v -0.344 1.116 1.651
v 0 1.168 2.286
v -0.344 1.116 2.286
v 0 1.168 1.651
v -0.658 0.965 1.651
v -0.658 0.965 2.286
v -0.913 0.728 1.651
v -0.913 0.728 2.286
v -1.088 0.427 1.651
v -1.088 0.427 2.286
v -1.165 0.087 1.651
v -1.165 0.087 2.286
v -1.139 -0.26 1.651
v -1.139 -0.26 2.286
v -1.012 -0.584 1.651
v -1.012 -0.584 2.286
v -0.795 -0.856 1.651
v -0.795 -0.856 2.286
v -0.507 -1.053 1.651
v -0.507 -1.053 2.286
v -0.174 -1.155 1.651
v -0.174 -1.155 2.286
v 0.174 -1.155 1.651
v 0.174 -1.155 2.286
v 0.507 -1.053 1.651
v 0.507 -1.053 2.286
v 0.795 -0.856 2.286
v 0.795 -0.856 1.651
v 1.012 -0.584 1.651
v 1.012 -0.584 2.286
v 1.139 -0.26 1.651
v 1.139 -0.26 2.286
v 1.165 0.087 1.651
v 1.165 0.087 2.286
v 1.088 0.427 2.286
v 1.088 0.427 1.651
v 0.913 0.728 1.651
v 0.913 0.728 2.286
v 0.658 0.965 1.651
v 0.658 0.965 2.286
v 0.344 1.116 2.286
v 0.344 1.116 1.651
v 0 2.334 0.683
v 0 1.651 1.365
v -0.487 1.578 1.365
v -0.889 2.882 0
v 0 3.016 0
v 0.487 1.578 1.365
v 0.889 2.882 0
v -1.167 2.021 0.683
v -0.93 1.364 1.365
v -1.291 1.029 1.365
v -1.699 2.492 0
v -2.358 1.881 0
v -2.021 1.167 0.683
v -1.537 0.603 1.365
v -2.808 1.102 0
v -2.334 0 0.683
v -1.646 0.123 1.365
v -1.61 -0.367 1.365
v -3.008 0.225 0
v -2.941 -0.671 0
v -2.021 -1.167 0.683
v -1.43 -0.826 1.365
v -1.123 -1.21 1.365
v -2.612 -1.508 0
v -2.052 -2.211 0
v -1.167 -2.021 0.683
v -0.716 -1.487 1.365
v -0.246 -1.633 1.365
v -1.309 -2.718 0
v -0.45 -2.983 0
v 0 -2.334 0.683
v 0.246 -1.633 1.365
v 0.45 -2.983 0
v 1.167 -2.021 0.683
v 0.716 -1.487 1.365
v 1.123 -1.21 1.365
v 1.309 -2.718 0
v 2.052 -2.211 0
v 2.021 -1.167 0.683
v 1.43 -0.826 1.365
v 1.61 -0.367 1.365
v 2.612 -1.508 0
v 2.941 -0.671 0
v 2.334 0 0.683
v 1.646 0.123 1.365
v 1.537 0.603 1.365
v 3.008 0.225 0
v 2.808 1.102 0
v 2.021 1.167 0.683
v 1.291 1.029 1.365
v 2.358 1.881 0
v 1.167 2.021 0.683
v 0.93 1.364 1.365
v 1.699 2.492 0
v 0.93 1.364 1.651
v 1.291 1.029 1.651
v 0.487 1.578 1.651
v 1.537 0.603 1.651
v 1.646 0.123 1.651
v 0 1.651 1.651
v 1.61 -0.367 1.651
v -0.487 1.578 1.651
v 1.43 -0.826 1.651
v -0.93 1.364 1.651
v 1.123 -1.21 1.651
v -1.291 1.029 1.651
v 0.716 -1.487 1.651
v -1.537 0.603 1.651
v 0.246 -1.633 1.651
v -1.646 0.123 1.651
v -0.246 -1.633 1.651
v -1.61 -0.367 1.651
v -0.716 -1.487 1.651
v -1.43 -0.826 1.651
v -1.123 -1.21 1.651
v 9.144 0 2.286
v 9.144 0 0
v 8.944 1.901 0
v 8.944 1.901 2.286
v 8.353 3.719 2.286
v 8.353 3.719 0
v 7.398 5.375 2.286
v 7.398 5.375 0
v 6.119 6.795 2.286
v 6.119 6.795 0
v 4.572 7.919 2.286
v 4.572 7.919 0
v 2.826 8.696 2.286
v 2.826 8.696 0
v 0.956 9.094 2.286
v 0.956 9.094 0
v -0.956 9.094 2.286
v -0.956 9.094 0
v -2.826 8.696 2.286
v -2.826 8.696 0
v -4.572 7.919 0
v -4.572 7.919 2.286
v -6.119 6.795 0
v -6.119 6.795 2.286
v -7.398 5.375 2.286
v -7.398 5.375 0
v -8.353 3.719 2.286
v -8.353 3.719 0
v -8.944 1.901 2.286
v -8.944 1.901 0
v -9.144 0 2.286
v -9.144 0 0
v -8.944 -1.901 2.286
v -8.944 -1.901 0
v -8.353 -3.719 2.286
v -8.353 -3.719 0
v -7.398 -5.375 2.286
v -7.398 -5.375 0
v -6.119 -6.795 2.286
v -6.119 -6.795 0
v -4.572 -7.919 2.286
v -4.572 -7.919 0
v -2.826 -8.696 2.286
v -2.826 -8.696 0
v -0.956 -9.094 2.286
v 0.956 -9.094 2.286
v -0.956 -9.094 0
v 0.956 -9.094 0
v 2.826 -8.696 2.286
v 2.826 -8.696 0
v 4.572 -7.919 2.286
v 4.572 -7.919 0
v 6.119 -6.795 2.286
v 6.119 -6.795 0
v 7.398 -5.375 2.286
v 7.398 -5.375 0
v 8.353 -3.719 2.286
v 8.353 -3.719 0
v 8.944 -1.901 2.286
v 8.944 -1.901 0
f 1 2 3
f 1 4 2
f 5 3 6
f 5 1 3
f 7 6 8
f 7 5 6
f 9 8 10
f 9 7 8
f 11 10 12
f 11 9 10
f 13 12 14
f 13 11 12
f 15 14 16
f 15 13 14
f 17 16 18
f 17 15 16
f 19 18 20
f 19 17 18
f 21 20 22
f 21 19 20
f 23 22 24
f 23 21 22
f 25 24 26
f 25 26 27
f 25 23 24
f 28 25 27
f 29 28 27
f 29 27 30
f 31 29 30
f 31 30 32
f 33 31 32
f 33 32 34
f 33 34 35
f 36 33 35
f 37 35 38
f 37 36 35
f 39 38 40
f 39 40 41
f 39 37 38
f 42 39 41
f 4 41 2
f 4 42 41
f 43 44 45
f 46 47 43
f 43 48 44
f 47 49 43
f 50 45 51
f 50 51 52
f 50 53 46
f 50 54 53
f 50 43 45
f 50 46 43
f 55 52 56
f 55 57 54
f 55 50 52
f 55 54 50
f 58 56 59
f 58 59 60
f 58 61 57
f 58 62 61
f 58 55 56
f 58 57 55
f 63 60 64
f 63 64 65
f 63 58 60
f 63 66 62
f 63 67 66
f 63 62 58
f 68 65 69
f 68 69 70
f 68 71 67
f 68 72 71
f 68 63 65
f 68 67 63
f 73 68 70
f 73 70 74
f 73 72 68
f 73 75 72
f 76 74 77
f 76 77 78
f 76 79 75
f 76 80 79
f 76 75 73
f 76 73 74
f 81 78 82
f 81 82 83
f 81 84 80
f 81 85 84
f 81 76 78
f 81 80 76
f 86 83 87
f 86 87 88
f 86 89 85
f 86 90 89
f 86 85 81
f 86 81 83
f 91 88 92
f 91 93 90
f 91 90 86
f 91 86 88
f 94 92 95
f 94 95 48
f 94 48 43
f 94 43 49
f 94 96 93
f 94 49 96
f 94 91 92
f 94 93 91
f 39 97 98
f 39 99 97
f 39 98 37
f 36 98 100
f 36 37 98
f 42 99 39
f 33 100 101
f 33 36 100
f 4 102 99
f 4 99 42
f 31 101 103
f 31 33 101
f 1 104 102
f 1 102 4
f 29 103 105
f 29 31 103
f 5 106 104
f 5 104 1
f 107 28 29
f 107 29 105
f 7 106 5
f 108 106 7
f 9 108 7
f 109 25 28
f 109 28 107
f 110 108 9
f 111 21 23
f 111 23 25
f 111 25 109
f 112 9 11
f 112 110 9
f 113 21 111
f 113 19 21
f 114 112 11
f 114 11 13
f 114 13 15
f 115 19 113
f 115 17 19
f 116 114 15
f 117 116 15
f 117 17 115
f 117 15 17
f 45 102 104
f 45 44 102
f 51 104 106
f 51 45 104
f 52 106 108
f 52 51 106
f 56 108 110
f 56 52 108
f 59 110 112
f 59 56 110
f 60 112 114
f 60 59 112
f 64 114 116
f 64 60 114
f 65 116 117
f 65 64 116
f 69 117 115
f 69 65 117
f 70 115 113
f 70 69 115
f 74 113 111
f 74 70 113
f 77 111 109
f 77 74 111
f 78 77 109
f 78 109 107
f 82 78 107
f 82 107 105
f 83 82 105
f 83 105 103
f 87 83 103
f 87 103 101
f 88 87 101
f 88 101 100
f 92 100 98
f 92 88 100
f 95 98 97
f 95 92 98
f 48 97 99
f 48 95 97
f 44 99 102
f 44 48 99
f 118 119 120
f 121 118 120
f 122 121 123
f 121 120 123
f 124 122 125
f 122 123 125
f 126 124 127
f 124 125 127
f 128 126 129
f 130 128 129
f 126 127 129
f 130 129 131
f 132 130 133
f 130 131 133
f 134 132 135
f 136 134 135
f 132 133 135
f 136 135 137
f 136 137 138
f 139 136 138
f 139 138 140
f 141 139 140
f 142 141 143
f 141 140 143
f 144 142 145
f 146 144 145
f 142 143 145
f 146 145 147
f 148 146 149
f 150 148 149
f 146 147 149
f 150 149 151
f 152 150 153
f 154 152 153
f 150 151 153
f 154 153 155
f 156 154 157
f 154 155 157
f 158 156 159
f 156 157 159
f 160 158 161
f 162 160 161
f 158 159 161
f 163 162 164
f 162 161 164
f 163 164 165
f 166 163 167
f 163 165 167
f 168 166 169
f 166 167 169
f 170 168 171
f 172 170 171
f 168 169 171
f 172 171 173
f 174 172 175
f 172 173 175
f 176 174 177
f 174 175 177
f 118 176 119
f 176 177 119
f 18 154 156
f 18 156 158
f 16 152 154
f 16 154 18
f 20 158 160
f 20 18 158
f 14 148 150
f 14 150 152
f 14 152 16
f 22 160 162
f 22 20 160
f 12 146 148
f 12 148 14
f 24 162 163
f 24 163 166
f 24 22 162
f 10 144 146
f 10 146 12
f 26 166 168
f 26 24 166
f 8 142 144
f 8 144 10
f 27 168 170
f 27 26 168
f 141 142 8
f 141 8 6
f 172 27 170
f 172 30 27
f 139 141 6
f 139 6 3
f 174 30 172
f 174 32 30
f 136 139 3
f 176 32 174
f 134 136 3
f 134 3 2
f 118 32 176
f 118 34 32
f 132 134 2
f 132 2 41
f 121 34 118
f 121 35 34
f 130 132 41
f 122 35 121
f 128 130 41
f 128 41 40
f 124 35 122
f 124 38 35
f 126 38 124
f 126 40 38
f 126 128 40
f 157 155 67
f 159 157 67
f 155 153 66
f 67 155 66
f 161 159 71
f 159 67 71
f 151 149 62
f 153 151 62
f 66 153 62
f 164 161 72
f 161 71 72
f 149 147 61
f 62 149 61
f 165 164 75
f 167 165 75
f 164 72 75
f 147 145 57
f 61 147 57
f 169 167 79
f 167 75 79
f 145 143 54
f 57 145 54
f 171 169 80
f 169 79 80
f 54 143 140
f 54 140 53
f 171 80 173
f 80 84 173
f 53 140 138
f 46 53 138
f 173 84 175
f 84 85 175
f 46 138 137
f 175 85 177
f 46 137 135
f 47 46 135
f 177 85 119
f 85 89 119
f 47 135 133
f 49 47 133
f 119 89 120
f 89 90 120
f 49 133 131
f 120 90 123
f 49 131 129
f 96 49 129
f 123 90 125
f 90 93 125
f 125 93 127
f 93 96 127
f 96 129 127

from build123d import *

# Parameters (mm, degrees)
SKETCH1_R           = 9.144
BOSS_EXTRUDE1_DEPTH = 2.286


with BuildPart() as part:
    # Sketch1 → Boss-Extrude1 (new body)
    with BuildSketch(Plane.XY):
        Circle(SKETCH1_R)
    extrude(amount=BOSS_EXTRUDE1_DEPTH)

    # Sketch7 → CBORE for #1 Binding Head Machine Screw2 (revolve, cut)
    with BuildSketch(Plane.YZ):
        Polygon((0, 0), (0, 2.286), (1.1684, 2.286), (1.1684, 1.651), (1.651, 1.651), (1.651, 1.36525), (3.01625, 0), align=None)
    revolve(axis=Axis((0, 0, -6.35), (0, 0, 1)), mode=Mode.SUBTRACT)


solid = part.part
